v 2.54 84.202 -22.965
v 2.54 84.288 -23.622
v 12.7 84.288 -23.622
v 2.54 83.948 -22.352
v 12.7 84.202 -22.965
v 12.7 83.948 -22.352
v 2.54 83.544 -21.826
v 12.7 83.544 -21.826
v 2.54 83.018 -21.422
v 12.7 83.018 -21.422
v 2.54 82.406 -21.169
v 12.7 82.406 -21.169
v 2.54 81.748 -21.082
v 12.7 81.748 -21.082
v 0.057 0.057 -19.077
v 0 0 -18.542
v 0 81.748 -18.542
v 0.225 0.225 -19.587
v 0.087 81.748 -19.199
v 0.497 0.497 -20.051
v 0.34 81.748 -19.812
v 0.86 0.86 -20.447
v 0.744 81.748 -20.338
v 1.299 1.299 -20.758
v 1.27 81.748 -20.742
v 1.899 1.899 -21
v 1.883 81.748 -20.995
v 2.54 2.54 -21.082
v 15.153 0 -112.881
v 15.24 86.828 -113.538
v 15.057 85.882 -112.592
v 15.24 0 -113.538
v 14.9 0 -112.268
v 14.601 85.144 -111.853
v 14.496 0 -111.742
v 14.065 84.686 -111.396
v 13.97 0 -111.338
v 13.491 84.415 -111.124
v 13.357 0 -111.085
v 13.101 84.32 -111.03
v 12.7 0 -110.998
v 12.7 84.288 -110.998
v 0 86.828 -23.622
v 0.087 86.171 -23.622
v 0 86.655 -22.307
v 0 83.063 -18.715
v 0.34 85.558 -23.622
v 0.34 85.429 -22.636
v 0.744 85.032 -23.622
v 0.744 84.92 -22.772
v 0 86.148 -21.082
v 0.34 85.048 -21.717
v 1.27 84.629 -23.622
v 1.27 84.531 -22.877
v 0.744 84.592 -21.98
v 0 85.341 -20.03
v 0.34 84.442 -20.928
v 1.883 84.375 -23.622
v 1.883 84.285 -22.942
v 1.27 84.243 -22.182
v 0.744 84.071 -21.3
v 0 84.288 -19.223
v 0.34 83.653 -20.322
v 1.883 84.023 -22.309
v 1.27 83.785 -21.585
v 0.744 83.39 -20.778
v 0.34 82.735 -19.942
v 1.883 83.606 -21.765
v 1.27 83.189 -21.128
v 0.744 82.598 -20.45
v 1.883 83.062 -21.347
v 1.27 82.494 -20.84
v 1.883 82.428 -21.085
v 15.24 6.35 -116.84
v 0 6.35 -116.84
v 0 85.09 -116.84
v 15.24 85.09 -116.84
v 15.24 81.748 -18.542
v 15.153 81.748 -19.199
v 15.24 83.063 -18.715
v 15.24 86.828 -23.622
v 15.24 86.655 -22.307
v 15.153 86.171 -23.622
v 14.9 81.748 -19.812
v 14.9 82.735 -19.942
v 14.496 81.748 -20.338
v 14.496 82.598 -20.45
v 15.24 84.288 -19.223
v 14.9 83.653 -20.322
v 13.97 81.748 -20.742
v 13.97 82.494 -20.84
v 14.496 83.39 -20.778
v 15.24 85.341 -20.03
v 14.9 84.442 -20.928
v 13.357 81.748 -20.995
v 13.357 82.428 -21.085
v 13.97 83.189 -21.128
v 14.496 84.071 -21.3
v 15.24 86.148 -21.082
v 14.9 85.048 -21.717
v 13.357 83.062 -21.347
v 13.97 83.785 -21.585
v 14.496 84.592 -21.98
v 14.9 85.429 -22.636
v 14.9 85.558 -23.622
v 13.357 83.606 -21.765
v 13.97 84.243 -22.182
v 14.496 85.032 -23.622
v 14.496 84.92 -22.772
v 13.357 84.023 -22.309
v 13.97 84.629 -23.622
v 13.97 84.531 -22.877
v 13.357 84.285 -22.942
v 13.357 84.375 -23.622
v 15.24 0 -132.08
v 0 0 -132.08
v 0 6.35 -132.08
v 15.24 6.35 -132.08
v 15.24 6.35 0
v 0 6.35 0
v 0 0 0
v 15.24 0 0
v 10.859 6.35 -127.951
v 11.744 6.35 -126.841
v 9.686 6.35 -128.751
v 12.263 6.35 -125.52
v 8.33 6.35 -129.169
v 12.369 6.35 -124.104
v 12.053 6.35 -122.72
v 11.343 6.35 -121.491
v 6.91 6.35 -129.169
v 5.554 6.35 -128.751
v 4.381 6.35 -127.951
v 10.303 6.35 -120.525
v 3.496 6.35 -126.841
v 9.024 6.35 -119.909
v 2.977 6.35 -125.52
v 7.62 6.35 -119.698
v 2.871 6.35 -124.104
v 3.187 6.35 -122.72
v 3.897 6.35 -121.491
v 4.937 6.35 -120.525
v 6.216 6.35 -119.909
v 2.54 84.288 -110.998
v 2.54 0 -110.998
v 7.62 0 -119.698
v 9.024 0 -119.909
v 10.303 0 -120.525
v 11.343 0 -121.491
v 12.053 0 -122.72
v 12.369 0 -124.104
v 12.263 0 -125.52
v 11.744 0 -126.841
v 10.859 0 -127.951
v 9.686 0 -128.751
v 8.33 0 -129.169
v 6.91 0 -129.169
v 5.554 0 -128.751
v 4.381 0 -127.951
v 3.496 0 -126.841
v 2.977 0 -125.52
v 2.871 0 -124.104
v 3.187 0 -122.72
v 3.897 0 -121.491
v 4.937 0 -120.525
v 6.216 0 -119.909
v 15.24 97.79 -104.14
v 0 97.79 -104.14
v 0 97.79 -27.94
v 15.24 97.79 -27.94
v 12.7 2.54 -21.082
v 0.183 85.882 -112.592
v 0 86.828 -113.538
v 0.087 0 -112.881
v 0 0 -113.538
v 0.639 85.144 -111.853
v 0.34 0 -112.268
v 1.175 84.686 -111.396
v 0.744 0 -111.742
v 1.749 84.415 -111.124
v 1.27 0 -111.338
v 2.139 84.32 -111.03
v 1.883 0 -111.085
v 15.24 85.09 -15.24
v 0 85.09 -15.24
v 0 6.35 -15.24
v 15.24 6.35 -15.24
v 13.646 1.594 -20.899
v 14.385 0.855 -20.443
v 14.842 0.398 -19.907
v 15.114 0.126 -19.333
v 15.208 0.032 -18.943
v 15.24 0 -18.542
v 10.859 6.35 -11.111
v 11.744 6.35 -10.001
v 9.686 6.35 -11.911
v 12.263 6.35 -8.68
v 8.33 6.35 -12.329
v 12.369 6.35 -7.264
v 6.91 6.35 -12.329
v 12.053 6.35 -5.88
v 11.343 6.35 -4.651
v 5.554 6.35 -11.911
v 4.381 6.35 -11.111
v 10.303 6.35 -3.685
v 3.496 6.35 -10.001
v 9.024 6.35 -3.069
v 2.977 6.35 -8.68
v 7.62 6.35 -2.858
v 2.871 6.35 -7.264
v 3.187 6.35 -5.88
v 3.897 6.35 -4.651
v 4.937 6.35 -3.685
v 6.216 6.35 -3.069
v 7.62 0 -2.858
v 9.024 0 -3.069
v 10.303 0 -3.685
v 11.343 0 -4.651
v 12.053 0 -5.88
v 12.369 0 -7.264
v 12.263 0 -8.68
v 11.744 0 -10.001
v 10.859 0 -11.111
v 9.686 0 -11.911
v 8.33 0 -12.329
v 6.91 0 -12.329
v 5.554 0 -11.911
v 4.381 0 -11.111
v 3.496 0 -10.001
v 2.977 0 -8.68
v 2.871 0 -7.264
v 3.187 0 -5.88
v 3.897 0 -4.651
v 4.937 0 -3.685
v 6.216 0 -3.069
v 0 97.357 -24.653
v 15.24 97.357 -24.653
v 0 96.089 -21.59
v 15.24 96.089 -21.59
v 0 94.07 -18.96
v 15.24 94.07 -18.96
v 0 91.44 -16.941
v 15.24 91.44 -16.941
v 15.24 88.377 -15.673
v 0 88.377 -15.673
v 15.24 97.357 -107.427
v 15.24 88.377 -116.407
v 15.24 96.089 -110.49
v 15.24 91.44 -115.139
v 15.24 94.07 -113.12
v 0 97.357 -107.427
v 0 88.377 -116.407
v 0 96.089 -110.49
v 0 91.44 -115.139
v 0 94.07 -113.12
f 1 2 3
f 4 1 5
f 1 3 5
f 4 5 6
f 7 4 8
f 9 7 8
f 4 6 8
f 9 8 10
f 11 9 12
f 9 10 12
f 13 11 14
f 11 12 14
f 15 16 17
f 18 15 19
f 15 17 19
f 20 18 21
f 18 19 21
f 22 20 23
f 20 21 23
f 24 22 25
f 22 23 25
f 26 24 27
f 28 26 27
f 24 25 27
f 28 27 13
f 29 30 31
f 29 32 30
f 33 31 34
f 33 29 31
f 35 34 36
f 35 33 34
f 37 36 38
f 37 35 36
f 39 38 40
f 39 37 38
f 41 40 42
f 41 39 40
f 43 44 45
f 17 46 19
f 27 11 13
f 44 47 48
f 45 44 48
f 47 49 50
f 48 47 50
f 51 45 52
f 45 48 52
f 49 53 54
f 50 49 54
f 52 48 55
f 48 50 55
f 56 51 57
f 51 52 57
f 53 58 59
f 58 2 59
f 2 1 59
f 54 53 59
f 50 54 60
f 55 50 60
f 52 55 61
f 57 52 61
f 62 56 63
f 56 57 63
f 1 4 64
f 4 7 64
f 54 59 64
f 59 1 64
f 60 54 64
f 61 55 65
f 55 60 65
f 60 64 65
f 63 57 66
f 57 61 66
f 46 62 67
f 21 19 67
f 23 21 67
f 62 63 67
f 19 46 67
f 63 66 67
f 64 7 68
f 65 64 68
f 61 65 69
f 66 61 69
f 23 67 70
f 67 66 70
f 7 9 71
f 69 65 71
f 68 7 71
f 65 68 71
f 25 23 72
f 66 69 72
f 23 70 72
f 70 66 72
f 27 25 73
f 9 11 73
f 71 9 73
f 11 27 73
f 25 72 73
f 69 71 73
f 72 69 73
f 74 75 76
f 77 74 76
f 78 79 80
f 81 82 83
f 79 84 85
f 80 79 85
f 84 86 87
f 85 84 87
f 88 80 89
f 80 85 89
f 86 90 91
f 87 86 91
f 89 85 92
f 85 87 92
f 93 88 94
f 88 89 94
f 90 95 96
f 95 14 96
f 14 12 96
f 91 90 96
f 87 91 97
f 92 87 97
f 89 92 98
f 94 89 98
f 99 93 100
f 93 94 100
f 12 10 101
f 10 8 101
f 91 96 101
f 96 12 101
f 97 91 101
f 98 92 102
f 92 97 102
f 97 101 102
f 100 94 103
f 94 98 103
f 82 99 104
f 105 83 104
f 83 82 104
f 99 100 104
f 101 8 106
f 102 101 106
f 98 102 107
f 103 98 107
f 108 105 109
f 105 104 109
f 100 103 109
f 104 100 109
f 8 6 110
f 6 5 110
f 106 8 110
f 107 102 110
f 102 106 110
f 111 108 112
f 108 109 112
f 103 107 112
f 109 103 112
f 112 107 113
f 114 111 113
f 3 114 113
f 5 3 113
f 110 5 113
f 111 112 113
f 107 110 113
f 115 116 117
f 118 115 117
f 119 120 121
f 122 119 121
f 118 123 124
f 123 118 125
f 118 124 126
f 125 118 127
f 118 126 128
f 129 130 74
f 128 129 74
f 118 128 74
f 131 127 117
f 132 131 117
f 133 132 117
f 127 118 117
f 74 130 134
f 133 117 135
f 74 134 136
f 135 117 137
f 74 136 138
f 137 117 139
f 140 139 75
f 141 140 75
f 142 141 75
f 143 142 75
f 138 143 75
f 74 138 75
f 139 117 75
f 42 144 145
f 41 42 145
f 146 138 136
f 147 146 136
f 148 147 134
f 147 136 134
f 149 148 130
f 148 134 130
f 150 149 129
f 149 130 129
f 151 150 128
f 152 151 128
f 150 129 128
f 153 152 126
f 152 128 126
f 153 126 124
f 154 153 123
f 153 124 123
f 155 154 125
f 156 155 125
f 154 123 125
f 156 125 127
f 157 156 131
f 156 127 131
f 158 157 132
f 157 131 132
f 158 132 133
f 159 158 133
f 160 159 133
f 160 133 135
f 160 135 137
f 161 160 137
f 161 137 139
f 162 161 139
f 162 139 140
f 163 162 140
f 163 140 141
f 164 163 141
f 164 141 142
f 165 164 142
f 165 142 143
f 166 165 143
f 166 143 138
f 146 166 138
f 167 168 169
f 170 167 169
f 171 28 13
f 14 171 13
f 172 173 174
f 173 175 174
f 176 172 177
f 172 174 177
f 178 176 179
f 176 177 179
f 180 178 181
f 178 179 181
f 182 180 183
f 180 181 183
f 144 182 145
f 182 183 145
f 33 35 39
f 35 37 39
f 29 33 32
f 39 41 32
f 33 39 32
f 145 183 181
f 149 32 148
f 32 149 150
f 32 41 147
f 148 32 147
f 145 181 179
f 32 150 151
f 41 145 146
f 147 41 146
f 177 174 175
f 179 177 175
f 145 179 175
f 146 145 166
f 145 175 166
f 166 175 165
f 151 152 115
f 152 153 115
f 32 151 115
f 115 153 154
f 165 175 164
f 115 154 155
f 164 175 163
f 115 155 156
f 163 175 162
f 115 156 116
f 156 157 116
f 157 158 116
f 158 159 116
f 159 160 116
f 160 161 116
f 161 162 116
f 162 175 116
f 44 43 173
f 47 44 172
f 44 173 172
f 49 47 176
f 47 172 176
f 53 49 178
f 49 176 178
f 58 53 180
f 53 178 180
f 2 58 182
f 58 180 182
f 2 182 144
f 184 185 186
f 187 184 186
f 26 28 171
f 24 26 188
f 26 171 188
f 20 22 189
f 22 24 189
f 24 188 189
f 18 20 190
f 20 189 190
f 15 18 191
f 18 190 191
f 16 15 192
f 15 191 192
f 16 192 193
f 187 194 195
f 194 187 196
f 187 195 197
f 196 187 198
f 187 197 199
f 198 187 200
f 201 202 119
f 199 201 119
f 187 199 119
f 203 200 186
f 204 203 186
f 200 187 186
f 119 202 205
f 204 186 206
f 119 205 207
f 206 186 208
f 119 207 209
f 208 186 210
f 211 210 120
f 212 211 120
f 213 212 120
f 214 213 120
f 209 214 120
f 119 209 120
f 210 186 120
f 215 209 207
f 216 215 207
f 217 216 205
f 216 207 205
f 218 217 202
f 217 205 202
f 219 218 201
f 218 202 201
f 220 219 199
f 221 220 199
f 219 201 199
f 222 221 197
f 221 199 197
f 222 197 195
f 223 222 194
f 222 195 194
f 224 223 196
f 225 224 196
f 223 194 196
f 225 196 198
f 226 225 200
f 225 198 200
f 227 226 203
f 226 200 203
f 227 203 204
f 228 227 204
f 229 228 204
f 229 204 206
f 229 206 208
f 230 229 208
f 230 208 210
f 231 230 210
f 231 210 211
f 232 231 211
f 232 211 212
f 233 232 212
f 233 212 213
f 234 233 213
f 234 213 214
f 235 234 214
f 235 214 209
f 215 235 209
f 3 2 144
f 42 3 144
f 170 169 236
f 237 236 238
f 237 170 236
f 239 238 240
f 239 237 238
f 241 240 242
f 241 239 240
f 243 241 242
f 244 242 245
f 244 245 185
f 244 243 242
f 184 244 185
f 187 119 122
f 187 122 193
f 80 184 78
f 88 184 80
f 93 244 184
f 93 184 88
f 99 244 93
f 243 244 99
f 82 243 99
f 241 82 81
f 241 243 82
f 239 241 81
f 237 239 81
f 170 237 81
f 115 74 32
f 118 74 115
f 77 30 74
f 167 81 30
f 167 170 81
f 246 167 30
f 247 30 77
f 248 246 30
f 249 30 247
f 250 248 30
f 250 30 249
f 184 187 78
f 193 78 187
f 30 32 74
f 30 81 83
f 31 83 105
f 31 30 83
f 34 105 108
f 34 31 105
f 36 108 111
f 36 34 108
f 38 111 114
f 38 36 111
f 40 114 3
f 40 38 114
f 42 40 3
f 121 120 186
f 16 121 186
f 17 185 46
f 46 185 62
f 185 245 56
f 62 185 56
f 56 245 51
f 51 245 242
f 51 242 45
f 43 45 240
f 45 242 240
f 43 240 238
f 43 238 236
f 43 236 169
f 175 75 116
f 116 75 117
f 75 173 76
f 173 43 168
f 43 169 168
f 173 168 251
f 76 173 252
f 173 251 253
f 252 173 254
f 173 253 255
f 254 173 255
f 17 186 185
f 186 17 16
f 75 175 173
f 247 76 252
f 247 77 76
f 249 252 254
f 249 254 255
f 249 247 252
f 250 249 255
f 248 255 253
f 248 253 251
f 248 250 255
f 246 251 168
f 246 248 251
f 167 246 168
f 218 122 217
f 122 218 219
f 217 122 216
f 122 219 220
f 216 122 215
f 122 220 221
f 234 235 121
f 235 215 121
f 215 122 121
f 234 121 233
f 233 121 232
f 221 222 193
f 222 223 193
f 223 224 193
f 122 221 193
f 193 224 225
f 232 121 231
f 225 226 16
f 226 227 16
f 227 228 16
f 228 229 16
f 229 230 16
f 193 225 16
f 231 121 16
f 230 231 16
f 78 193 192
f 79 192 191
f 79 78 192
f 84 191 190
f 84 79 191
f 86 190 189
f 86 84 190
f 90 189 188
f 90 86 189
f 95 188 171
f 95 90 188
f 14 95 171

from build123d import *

# Parameters (mm, degrees)
BOSS_EXTRUDE1_DEPTH = 15.24
FILLET1_R           = 12.7
SKETCH2_R           = 4.7625
CUT_EXTRUDE1_DEPTH  = 17.78
FILLET2_R           = 2.54
LPATTERN1_COUNT     = 2
LPATTERN1_PITCH     = 116.84


with BuildPart() as part:
    # Sketch1 → Boss-Extrude1 (new body)
    with BuildSketch(Plane(origin=(0, 0, 0), x_dir=(0, 0, -1), z_dir=(1, 0, 0))):
        Polygon((0, 6.35), (0, 0), (21.082, 0), (21.082, 6.35), (21.082, 84.288418695), (110.998, 84.288418695), (110.998, 0), (132.08, 0), (132.08, 6.35), (116.84, 6.35), (116.84, 97.79), (15.24, 97.79), (15.24, 6.35), align=None)
    extrude(amount=BOSS_EXTRUDE1_DEPTH)

    # Fillet1
    fillet1_edges = [part.edges().sort_by_distance(p)[0] for p in [
        (7.62, 97.79, -15.24),
        (7.62, 97.79, -116.84),
    ]]
    fillet(fillet1_edges, radius=FILLET1_R)

    # Sketch2 → Cut-Extrude1 (cut)
    with BuildSketch(Plane(origin=(0, 6.35, 0), x_dir=(1, 0, 0), z_dir=(0, 1, 0))):
        with Locations(Location((7.62, 7.62, 0), (0, 0, 270))):
            Circle(SKETCH2_R)
    cut_extrude1 = extrude(amount=-CUT_EXTRUDE1_DEPTH, mode=Mode.SUBTRACT)

    # Fillet2
    fillet2_edges = [part.edges().sort_by_distance(p)[0] for p in [
        (15.24, 84.288418695, -66.04),
        (15.24, 42.144209348, -110.998),
        (0, 42.144209348, -110.998),
        (0, 84.288418695, -66.04),
        (0, 42.144209348, -21.082),
        (7.62, 0, -21.082),
        (7.62, 84.288418695, -21.082),
        (15.24, 42.144209348, -21.082),
    ]]
    fillet(fillet2_edges, radius=FILLET2_R)

    # LPattern1: Cut-Extrude1 ×2
    with Locations(*[(0, 0, -i * LPATTERN1_PITCH) for i in range(1, LPATTERN1_COUNT)]):
        add(cut_extrude1, mode=Mode.SUBTRACT)


solid = part.part
